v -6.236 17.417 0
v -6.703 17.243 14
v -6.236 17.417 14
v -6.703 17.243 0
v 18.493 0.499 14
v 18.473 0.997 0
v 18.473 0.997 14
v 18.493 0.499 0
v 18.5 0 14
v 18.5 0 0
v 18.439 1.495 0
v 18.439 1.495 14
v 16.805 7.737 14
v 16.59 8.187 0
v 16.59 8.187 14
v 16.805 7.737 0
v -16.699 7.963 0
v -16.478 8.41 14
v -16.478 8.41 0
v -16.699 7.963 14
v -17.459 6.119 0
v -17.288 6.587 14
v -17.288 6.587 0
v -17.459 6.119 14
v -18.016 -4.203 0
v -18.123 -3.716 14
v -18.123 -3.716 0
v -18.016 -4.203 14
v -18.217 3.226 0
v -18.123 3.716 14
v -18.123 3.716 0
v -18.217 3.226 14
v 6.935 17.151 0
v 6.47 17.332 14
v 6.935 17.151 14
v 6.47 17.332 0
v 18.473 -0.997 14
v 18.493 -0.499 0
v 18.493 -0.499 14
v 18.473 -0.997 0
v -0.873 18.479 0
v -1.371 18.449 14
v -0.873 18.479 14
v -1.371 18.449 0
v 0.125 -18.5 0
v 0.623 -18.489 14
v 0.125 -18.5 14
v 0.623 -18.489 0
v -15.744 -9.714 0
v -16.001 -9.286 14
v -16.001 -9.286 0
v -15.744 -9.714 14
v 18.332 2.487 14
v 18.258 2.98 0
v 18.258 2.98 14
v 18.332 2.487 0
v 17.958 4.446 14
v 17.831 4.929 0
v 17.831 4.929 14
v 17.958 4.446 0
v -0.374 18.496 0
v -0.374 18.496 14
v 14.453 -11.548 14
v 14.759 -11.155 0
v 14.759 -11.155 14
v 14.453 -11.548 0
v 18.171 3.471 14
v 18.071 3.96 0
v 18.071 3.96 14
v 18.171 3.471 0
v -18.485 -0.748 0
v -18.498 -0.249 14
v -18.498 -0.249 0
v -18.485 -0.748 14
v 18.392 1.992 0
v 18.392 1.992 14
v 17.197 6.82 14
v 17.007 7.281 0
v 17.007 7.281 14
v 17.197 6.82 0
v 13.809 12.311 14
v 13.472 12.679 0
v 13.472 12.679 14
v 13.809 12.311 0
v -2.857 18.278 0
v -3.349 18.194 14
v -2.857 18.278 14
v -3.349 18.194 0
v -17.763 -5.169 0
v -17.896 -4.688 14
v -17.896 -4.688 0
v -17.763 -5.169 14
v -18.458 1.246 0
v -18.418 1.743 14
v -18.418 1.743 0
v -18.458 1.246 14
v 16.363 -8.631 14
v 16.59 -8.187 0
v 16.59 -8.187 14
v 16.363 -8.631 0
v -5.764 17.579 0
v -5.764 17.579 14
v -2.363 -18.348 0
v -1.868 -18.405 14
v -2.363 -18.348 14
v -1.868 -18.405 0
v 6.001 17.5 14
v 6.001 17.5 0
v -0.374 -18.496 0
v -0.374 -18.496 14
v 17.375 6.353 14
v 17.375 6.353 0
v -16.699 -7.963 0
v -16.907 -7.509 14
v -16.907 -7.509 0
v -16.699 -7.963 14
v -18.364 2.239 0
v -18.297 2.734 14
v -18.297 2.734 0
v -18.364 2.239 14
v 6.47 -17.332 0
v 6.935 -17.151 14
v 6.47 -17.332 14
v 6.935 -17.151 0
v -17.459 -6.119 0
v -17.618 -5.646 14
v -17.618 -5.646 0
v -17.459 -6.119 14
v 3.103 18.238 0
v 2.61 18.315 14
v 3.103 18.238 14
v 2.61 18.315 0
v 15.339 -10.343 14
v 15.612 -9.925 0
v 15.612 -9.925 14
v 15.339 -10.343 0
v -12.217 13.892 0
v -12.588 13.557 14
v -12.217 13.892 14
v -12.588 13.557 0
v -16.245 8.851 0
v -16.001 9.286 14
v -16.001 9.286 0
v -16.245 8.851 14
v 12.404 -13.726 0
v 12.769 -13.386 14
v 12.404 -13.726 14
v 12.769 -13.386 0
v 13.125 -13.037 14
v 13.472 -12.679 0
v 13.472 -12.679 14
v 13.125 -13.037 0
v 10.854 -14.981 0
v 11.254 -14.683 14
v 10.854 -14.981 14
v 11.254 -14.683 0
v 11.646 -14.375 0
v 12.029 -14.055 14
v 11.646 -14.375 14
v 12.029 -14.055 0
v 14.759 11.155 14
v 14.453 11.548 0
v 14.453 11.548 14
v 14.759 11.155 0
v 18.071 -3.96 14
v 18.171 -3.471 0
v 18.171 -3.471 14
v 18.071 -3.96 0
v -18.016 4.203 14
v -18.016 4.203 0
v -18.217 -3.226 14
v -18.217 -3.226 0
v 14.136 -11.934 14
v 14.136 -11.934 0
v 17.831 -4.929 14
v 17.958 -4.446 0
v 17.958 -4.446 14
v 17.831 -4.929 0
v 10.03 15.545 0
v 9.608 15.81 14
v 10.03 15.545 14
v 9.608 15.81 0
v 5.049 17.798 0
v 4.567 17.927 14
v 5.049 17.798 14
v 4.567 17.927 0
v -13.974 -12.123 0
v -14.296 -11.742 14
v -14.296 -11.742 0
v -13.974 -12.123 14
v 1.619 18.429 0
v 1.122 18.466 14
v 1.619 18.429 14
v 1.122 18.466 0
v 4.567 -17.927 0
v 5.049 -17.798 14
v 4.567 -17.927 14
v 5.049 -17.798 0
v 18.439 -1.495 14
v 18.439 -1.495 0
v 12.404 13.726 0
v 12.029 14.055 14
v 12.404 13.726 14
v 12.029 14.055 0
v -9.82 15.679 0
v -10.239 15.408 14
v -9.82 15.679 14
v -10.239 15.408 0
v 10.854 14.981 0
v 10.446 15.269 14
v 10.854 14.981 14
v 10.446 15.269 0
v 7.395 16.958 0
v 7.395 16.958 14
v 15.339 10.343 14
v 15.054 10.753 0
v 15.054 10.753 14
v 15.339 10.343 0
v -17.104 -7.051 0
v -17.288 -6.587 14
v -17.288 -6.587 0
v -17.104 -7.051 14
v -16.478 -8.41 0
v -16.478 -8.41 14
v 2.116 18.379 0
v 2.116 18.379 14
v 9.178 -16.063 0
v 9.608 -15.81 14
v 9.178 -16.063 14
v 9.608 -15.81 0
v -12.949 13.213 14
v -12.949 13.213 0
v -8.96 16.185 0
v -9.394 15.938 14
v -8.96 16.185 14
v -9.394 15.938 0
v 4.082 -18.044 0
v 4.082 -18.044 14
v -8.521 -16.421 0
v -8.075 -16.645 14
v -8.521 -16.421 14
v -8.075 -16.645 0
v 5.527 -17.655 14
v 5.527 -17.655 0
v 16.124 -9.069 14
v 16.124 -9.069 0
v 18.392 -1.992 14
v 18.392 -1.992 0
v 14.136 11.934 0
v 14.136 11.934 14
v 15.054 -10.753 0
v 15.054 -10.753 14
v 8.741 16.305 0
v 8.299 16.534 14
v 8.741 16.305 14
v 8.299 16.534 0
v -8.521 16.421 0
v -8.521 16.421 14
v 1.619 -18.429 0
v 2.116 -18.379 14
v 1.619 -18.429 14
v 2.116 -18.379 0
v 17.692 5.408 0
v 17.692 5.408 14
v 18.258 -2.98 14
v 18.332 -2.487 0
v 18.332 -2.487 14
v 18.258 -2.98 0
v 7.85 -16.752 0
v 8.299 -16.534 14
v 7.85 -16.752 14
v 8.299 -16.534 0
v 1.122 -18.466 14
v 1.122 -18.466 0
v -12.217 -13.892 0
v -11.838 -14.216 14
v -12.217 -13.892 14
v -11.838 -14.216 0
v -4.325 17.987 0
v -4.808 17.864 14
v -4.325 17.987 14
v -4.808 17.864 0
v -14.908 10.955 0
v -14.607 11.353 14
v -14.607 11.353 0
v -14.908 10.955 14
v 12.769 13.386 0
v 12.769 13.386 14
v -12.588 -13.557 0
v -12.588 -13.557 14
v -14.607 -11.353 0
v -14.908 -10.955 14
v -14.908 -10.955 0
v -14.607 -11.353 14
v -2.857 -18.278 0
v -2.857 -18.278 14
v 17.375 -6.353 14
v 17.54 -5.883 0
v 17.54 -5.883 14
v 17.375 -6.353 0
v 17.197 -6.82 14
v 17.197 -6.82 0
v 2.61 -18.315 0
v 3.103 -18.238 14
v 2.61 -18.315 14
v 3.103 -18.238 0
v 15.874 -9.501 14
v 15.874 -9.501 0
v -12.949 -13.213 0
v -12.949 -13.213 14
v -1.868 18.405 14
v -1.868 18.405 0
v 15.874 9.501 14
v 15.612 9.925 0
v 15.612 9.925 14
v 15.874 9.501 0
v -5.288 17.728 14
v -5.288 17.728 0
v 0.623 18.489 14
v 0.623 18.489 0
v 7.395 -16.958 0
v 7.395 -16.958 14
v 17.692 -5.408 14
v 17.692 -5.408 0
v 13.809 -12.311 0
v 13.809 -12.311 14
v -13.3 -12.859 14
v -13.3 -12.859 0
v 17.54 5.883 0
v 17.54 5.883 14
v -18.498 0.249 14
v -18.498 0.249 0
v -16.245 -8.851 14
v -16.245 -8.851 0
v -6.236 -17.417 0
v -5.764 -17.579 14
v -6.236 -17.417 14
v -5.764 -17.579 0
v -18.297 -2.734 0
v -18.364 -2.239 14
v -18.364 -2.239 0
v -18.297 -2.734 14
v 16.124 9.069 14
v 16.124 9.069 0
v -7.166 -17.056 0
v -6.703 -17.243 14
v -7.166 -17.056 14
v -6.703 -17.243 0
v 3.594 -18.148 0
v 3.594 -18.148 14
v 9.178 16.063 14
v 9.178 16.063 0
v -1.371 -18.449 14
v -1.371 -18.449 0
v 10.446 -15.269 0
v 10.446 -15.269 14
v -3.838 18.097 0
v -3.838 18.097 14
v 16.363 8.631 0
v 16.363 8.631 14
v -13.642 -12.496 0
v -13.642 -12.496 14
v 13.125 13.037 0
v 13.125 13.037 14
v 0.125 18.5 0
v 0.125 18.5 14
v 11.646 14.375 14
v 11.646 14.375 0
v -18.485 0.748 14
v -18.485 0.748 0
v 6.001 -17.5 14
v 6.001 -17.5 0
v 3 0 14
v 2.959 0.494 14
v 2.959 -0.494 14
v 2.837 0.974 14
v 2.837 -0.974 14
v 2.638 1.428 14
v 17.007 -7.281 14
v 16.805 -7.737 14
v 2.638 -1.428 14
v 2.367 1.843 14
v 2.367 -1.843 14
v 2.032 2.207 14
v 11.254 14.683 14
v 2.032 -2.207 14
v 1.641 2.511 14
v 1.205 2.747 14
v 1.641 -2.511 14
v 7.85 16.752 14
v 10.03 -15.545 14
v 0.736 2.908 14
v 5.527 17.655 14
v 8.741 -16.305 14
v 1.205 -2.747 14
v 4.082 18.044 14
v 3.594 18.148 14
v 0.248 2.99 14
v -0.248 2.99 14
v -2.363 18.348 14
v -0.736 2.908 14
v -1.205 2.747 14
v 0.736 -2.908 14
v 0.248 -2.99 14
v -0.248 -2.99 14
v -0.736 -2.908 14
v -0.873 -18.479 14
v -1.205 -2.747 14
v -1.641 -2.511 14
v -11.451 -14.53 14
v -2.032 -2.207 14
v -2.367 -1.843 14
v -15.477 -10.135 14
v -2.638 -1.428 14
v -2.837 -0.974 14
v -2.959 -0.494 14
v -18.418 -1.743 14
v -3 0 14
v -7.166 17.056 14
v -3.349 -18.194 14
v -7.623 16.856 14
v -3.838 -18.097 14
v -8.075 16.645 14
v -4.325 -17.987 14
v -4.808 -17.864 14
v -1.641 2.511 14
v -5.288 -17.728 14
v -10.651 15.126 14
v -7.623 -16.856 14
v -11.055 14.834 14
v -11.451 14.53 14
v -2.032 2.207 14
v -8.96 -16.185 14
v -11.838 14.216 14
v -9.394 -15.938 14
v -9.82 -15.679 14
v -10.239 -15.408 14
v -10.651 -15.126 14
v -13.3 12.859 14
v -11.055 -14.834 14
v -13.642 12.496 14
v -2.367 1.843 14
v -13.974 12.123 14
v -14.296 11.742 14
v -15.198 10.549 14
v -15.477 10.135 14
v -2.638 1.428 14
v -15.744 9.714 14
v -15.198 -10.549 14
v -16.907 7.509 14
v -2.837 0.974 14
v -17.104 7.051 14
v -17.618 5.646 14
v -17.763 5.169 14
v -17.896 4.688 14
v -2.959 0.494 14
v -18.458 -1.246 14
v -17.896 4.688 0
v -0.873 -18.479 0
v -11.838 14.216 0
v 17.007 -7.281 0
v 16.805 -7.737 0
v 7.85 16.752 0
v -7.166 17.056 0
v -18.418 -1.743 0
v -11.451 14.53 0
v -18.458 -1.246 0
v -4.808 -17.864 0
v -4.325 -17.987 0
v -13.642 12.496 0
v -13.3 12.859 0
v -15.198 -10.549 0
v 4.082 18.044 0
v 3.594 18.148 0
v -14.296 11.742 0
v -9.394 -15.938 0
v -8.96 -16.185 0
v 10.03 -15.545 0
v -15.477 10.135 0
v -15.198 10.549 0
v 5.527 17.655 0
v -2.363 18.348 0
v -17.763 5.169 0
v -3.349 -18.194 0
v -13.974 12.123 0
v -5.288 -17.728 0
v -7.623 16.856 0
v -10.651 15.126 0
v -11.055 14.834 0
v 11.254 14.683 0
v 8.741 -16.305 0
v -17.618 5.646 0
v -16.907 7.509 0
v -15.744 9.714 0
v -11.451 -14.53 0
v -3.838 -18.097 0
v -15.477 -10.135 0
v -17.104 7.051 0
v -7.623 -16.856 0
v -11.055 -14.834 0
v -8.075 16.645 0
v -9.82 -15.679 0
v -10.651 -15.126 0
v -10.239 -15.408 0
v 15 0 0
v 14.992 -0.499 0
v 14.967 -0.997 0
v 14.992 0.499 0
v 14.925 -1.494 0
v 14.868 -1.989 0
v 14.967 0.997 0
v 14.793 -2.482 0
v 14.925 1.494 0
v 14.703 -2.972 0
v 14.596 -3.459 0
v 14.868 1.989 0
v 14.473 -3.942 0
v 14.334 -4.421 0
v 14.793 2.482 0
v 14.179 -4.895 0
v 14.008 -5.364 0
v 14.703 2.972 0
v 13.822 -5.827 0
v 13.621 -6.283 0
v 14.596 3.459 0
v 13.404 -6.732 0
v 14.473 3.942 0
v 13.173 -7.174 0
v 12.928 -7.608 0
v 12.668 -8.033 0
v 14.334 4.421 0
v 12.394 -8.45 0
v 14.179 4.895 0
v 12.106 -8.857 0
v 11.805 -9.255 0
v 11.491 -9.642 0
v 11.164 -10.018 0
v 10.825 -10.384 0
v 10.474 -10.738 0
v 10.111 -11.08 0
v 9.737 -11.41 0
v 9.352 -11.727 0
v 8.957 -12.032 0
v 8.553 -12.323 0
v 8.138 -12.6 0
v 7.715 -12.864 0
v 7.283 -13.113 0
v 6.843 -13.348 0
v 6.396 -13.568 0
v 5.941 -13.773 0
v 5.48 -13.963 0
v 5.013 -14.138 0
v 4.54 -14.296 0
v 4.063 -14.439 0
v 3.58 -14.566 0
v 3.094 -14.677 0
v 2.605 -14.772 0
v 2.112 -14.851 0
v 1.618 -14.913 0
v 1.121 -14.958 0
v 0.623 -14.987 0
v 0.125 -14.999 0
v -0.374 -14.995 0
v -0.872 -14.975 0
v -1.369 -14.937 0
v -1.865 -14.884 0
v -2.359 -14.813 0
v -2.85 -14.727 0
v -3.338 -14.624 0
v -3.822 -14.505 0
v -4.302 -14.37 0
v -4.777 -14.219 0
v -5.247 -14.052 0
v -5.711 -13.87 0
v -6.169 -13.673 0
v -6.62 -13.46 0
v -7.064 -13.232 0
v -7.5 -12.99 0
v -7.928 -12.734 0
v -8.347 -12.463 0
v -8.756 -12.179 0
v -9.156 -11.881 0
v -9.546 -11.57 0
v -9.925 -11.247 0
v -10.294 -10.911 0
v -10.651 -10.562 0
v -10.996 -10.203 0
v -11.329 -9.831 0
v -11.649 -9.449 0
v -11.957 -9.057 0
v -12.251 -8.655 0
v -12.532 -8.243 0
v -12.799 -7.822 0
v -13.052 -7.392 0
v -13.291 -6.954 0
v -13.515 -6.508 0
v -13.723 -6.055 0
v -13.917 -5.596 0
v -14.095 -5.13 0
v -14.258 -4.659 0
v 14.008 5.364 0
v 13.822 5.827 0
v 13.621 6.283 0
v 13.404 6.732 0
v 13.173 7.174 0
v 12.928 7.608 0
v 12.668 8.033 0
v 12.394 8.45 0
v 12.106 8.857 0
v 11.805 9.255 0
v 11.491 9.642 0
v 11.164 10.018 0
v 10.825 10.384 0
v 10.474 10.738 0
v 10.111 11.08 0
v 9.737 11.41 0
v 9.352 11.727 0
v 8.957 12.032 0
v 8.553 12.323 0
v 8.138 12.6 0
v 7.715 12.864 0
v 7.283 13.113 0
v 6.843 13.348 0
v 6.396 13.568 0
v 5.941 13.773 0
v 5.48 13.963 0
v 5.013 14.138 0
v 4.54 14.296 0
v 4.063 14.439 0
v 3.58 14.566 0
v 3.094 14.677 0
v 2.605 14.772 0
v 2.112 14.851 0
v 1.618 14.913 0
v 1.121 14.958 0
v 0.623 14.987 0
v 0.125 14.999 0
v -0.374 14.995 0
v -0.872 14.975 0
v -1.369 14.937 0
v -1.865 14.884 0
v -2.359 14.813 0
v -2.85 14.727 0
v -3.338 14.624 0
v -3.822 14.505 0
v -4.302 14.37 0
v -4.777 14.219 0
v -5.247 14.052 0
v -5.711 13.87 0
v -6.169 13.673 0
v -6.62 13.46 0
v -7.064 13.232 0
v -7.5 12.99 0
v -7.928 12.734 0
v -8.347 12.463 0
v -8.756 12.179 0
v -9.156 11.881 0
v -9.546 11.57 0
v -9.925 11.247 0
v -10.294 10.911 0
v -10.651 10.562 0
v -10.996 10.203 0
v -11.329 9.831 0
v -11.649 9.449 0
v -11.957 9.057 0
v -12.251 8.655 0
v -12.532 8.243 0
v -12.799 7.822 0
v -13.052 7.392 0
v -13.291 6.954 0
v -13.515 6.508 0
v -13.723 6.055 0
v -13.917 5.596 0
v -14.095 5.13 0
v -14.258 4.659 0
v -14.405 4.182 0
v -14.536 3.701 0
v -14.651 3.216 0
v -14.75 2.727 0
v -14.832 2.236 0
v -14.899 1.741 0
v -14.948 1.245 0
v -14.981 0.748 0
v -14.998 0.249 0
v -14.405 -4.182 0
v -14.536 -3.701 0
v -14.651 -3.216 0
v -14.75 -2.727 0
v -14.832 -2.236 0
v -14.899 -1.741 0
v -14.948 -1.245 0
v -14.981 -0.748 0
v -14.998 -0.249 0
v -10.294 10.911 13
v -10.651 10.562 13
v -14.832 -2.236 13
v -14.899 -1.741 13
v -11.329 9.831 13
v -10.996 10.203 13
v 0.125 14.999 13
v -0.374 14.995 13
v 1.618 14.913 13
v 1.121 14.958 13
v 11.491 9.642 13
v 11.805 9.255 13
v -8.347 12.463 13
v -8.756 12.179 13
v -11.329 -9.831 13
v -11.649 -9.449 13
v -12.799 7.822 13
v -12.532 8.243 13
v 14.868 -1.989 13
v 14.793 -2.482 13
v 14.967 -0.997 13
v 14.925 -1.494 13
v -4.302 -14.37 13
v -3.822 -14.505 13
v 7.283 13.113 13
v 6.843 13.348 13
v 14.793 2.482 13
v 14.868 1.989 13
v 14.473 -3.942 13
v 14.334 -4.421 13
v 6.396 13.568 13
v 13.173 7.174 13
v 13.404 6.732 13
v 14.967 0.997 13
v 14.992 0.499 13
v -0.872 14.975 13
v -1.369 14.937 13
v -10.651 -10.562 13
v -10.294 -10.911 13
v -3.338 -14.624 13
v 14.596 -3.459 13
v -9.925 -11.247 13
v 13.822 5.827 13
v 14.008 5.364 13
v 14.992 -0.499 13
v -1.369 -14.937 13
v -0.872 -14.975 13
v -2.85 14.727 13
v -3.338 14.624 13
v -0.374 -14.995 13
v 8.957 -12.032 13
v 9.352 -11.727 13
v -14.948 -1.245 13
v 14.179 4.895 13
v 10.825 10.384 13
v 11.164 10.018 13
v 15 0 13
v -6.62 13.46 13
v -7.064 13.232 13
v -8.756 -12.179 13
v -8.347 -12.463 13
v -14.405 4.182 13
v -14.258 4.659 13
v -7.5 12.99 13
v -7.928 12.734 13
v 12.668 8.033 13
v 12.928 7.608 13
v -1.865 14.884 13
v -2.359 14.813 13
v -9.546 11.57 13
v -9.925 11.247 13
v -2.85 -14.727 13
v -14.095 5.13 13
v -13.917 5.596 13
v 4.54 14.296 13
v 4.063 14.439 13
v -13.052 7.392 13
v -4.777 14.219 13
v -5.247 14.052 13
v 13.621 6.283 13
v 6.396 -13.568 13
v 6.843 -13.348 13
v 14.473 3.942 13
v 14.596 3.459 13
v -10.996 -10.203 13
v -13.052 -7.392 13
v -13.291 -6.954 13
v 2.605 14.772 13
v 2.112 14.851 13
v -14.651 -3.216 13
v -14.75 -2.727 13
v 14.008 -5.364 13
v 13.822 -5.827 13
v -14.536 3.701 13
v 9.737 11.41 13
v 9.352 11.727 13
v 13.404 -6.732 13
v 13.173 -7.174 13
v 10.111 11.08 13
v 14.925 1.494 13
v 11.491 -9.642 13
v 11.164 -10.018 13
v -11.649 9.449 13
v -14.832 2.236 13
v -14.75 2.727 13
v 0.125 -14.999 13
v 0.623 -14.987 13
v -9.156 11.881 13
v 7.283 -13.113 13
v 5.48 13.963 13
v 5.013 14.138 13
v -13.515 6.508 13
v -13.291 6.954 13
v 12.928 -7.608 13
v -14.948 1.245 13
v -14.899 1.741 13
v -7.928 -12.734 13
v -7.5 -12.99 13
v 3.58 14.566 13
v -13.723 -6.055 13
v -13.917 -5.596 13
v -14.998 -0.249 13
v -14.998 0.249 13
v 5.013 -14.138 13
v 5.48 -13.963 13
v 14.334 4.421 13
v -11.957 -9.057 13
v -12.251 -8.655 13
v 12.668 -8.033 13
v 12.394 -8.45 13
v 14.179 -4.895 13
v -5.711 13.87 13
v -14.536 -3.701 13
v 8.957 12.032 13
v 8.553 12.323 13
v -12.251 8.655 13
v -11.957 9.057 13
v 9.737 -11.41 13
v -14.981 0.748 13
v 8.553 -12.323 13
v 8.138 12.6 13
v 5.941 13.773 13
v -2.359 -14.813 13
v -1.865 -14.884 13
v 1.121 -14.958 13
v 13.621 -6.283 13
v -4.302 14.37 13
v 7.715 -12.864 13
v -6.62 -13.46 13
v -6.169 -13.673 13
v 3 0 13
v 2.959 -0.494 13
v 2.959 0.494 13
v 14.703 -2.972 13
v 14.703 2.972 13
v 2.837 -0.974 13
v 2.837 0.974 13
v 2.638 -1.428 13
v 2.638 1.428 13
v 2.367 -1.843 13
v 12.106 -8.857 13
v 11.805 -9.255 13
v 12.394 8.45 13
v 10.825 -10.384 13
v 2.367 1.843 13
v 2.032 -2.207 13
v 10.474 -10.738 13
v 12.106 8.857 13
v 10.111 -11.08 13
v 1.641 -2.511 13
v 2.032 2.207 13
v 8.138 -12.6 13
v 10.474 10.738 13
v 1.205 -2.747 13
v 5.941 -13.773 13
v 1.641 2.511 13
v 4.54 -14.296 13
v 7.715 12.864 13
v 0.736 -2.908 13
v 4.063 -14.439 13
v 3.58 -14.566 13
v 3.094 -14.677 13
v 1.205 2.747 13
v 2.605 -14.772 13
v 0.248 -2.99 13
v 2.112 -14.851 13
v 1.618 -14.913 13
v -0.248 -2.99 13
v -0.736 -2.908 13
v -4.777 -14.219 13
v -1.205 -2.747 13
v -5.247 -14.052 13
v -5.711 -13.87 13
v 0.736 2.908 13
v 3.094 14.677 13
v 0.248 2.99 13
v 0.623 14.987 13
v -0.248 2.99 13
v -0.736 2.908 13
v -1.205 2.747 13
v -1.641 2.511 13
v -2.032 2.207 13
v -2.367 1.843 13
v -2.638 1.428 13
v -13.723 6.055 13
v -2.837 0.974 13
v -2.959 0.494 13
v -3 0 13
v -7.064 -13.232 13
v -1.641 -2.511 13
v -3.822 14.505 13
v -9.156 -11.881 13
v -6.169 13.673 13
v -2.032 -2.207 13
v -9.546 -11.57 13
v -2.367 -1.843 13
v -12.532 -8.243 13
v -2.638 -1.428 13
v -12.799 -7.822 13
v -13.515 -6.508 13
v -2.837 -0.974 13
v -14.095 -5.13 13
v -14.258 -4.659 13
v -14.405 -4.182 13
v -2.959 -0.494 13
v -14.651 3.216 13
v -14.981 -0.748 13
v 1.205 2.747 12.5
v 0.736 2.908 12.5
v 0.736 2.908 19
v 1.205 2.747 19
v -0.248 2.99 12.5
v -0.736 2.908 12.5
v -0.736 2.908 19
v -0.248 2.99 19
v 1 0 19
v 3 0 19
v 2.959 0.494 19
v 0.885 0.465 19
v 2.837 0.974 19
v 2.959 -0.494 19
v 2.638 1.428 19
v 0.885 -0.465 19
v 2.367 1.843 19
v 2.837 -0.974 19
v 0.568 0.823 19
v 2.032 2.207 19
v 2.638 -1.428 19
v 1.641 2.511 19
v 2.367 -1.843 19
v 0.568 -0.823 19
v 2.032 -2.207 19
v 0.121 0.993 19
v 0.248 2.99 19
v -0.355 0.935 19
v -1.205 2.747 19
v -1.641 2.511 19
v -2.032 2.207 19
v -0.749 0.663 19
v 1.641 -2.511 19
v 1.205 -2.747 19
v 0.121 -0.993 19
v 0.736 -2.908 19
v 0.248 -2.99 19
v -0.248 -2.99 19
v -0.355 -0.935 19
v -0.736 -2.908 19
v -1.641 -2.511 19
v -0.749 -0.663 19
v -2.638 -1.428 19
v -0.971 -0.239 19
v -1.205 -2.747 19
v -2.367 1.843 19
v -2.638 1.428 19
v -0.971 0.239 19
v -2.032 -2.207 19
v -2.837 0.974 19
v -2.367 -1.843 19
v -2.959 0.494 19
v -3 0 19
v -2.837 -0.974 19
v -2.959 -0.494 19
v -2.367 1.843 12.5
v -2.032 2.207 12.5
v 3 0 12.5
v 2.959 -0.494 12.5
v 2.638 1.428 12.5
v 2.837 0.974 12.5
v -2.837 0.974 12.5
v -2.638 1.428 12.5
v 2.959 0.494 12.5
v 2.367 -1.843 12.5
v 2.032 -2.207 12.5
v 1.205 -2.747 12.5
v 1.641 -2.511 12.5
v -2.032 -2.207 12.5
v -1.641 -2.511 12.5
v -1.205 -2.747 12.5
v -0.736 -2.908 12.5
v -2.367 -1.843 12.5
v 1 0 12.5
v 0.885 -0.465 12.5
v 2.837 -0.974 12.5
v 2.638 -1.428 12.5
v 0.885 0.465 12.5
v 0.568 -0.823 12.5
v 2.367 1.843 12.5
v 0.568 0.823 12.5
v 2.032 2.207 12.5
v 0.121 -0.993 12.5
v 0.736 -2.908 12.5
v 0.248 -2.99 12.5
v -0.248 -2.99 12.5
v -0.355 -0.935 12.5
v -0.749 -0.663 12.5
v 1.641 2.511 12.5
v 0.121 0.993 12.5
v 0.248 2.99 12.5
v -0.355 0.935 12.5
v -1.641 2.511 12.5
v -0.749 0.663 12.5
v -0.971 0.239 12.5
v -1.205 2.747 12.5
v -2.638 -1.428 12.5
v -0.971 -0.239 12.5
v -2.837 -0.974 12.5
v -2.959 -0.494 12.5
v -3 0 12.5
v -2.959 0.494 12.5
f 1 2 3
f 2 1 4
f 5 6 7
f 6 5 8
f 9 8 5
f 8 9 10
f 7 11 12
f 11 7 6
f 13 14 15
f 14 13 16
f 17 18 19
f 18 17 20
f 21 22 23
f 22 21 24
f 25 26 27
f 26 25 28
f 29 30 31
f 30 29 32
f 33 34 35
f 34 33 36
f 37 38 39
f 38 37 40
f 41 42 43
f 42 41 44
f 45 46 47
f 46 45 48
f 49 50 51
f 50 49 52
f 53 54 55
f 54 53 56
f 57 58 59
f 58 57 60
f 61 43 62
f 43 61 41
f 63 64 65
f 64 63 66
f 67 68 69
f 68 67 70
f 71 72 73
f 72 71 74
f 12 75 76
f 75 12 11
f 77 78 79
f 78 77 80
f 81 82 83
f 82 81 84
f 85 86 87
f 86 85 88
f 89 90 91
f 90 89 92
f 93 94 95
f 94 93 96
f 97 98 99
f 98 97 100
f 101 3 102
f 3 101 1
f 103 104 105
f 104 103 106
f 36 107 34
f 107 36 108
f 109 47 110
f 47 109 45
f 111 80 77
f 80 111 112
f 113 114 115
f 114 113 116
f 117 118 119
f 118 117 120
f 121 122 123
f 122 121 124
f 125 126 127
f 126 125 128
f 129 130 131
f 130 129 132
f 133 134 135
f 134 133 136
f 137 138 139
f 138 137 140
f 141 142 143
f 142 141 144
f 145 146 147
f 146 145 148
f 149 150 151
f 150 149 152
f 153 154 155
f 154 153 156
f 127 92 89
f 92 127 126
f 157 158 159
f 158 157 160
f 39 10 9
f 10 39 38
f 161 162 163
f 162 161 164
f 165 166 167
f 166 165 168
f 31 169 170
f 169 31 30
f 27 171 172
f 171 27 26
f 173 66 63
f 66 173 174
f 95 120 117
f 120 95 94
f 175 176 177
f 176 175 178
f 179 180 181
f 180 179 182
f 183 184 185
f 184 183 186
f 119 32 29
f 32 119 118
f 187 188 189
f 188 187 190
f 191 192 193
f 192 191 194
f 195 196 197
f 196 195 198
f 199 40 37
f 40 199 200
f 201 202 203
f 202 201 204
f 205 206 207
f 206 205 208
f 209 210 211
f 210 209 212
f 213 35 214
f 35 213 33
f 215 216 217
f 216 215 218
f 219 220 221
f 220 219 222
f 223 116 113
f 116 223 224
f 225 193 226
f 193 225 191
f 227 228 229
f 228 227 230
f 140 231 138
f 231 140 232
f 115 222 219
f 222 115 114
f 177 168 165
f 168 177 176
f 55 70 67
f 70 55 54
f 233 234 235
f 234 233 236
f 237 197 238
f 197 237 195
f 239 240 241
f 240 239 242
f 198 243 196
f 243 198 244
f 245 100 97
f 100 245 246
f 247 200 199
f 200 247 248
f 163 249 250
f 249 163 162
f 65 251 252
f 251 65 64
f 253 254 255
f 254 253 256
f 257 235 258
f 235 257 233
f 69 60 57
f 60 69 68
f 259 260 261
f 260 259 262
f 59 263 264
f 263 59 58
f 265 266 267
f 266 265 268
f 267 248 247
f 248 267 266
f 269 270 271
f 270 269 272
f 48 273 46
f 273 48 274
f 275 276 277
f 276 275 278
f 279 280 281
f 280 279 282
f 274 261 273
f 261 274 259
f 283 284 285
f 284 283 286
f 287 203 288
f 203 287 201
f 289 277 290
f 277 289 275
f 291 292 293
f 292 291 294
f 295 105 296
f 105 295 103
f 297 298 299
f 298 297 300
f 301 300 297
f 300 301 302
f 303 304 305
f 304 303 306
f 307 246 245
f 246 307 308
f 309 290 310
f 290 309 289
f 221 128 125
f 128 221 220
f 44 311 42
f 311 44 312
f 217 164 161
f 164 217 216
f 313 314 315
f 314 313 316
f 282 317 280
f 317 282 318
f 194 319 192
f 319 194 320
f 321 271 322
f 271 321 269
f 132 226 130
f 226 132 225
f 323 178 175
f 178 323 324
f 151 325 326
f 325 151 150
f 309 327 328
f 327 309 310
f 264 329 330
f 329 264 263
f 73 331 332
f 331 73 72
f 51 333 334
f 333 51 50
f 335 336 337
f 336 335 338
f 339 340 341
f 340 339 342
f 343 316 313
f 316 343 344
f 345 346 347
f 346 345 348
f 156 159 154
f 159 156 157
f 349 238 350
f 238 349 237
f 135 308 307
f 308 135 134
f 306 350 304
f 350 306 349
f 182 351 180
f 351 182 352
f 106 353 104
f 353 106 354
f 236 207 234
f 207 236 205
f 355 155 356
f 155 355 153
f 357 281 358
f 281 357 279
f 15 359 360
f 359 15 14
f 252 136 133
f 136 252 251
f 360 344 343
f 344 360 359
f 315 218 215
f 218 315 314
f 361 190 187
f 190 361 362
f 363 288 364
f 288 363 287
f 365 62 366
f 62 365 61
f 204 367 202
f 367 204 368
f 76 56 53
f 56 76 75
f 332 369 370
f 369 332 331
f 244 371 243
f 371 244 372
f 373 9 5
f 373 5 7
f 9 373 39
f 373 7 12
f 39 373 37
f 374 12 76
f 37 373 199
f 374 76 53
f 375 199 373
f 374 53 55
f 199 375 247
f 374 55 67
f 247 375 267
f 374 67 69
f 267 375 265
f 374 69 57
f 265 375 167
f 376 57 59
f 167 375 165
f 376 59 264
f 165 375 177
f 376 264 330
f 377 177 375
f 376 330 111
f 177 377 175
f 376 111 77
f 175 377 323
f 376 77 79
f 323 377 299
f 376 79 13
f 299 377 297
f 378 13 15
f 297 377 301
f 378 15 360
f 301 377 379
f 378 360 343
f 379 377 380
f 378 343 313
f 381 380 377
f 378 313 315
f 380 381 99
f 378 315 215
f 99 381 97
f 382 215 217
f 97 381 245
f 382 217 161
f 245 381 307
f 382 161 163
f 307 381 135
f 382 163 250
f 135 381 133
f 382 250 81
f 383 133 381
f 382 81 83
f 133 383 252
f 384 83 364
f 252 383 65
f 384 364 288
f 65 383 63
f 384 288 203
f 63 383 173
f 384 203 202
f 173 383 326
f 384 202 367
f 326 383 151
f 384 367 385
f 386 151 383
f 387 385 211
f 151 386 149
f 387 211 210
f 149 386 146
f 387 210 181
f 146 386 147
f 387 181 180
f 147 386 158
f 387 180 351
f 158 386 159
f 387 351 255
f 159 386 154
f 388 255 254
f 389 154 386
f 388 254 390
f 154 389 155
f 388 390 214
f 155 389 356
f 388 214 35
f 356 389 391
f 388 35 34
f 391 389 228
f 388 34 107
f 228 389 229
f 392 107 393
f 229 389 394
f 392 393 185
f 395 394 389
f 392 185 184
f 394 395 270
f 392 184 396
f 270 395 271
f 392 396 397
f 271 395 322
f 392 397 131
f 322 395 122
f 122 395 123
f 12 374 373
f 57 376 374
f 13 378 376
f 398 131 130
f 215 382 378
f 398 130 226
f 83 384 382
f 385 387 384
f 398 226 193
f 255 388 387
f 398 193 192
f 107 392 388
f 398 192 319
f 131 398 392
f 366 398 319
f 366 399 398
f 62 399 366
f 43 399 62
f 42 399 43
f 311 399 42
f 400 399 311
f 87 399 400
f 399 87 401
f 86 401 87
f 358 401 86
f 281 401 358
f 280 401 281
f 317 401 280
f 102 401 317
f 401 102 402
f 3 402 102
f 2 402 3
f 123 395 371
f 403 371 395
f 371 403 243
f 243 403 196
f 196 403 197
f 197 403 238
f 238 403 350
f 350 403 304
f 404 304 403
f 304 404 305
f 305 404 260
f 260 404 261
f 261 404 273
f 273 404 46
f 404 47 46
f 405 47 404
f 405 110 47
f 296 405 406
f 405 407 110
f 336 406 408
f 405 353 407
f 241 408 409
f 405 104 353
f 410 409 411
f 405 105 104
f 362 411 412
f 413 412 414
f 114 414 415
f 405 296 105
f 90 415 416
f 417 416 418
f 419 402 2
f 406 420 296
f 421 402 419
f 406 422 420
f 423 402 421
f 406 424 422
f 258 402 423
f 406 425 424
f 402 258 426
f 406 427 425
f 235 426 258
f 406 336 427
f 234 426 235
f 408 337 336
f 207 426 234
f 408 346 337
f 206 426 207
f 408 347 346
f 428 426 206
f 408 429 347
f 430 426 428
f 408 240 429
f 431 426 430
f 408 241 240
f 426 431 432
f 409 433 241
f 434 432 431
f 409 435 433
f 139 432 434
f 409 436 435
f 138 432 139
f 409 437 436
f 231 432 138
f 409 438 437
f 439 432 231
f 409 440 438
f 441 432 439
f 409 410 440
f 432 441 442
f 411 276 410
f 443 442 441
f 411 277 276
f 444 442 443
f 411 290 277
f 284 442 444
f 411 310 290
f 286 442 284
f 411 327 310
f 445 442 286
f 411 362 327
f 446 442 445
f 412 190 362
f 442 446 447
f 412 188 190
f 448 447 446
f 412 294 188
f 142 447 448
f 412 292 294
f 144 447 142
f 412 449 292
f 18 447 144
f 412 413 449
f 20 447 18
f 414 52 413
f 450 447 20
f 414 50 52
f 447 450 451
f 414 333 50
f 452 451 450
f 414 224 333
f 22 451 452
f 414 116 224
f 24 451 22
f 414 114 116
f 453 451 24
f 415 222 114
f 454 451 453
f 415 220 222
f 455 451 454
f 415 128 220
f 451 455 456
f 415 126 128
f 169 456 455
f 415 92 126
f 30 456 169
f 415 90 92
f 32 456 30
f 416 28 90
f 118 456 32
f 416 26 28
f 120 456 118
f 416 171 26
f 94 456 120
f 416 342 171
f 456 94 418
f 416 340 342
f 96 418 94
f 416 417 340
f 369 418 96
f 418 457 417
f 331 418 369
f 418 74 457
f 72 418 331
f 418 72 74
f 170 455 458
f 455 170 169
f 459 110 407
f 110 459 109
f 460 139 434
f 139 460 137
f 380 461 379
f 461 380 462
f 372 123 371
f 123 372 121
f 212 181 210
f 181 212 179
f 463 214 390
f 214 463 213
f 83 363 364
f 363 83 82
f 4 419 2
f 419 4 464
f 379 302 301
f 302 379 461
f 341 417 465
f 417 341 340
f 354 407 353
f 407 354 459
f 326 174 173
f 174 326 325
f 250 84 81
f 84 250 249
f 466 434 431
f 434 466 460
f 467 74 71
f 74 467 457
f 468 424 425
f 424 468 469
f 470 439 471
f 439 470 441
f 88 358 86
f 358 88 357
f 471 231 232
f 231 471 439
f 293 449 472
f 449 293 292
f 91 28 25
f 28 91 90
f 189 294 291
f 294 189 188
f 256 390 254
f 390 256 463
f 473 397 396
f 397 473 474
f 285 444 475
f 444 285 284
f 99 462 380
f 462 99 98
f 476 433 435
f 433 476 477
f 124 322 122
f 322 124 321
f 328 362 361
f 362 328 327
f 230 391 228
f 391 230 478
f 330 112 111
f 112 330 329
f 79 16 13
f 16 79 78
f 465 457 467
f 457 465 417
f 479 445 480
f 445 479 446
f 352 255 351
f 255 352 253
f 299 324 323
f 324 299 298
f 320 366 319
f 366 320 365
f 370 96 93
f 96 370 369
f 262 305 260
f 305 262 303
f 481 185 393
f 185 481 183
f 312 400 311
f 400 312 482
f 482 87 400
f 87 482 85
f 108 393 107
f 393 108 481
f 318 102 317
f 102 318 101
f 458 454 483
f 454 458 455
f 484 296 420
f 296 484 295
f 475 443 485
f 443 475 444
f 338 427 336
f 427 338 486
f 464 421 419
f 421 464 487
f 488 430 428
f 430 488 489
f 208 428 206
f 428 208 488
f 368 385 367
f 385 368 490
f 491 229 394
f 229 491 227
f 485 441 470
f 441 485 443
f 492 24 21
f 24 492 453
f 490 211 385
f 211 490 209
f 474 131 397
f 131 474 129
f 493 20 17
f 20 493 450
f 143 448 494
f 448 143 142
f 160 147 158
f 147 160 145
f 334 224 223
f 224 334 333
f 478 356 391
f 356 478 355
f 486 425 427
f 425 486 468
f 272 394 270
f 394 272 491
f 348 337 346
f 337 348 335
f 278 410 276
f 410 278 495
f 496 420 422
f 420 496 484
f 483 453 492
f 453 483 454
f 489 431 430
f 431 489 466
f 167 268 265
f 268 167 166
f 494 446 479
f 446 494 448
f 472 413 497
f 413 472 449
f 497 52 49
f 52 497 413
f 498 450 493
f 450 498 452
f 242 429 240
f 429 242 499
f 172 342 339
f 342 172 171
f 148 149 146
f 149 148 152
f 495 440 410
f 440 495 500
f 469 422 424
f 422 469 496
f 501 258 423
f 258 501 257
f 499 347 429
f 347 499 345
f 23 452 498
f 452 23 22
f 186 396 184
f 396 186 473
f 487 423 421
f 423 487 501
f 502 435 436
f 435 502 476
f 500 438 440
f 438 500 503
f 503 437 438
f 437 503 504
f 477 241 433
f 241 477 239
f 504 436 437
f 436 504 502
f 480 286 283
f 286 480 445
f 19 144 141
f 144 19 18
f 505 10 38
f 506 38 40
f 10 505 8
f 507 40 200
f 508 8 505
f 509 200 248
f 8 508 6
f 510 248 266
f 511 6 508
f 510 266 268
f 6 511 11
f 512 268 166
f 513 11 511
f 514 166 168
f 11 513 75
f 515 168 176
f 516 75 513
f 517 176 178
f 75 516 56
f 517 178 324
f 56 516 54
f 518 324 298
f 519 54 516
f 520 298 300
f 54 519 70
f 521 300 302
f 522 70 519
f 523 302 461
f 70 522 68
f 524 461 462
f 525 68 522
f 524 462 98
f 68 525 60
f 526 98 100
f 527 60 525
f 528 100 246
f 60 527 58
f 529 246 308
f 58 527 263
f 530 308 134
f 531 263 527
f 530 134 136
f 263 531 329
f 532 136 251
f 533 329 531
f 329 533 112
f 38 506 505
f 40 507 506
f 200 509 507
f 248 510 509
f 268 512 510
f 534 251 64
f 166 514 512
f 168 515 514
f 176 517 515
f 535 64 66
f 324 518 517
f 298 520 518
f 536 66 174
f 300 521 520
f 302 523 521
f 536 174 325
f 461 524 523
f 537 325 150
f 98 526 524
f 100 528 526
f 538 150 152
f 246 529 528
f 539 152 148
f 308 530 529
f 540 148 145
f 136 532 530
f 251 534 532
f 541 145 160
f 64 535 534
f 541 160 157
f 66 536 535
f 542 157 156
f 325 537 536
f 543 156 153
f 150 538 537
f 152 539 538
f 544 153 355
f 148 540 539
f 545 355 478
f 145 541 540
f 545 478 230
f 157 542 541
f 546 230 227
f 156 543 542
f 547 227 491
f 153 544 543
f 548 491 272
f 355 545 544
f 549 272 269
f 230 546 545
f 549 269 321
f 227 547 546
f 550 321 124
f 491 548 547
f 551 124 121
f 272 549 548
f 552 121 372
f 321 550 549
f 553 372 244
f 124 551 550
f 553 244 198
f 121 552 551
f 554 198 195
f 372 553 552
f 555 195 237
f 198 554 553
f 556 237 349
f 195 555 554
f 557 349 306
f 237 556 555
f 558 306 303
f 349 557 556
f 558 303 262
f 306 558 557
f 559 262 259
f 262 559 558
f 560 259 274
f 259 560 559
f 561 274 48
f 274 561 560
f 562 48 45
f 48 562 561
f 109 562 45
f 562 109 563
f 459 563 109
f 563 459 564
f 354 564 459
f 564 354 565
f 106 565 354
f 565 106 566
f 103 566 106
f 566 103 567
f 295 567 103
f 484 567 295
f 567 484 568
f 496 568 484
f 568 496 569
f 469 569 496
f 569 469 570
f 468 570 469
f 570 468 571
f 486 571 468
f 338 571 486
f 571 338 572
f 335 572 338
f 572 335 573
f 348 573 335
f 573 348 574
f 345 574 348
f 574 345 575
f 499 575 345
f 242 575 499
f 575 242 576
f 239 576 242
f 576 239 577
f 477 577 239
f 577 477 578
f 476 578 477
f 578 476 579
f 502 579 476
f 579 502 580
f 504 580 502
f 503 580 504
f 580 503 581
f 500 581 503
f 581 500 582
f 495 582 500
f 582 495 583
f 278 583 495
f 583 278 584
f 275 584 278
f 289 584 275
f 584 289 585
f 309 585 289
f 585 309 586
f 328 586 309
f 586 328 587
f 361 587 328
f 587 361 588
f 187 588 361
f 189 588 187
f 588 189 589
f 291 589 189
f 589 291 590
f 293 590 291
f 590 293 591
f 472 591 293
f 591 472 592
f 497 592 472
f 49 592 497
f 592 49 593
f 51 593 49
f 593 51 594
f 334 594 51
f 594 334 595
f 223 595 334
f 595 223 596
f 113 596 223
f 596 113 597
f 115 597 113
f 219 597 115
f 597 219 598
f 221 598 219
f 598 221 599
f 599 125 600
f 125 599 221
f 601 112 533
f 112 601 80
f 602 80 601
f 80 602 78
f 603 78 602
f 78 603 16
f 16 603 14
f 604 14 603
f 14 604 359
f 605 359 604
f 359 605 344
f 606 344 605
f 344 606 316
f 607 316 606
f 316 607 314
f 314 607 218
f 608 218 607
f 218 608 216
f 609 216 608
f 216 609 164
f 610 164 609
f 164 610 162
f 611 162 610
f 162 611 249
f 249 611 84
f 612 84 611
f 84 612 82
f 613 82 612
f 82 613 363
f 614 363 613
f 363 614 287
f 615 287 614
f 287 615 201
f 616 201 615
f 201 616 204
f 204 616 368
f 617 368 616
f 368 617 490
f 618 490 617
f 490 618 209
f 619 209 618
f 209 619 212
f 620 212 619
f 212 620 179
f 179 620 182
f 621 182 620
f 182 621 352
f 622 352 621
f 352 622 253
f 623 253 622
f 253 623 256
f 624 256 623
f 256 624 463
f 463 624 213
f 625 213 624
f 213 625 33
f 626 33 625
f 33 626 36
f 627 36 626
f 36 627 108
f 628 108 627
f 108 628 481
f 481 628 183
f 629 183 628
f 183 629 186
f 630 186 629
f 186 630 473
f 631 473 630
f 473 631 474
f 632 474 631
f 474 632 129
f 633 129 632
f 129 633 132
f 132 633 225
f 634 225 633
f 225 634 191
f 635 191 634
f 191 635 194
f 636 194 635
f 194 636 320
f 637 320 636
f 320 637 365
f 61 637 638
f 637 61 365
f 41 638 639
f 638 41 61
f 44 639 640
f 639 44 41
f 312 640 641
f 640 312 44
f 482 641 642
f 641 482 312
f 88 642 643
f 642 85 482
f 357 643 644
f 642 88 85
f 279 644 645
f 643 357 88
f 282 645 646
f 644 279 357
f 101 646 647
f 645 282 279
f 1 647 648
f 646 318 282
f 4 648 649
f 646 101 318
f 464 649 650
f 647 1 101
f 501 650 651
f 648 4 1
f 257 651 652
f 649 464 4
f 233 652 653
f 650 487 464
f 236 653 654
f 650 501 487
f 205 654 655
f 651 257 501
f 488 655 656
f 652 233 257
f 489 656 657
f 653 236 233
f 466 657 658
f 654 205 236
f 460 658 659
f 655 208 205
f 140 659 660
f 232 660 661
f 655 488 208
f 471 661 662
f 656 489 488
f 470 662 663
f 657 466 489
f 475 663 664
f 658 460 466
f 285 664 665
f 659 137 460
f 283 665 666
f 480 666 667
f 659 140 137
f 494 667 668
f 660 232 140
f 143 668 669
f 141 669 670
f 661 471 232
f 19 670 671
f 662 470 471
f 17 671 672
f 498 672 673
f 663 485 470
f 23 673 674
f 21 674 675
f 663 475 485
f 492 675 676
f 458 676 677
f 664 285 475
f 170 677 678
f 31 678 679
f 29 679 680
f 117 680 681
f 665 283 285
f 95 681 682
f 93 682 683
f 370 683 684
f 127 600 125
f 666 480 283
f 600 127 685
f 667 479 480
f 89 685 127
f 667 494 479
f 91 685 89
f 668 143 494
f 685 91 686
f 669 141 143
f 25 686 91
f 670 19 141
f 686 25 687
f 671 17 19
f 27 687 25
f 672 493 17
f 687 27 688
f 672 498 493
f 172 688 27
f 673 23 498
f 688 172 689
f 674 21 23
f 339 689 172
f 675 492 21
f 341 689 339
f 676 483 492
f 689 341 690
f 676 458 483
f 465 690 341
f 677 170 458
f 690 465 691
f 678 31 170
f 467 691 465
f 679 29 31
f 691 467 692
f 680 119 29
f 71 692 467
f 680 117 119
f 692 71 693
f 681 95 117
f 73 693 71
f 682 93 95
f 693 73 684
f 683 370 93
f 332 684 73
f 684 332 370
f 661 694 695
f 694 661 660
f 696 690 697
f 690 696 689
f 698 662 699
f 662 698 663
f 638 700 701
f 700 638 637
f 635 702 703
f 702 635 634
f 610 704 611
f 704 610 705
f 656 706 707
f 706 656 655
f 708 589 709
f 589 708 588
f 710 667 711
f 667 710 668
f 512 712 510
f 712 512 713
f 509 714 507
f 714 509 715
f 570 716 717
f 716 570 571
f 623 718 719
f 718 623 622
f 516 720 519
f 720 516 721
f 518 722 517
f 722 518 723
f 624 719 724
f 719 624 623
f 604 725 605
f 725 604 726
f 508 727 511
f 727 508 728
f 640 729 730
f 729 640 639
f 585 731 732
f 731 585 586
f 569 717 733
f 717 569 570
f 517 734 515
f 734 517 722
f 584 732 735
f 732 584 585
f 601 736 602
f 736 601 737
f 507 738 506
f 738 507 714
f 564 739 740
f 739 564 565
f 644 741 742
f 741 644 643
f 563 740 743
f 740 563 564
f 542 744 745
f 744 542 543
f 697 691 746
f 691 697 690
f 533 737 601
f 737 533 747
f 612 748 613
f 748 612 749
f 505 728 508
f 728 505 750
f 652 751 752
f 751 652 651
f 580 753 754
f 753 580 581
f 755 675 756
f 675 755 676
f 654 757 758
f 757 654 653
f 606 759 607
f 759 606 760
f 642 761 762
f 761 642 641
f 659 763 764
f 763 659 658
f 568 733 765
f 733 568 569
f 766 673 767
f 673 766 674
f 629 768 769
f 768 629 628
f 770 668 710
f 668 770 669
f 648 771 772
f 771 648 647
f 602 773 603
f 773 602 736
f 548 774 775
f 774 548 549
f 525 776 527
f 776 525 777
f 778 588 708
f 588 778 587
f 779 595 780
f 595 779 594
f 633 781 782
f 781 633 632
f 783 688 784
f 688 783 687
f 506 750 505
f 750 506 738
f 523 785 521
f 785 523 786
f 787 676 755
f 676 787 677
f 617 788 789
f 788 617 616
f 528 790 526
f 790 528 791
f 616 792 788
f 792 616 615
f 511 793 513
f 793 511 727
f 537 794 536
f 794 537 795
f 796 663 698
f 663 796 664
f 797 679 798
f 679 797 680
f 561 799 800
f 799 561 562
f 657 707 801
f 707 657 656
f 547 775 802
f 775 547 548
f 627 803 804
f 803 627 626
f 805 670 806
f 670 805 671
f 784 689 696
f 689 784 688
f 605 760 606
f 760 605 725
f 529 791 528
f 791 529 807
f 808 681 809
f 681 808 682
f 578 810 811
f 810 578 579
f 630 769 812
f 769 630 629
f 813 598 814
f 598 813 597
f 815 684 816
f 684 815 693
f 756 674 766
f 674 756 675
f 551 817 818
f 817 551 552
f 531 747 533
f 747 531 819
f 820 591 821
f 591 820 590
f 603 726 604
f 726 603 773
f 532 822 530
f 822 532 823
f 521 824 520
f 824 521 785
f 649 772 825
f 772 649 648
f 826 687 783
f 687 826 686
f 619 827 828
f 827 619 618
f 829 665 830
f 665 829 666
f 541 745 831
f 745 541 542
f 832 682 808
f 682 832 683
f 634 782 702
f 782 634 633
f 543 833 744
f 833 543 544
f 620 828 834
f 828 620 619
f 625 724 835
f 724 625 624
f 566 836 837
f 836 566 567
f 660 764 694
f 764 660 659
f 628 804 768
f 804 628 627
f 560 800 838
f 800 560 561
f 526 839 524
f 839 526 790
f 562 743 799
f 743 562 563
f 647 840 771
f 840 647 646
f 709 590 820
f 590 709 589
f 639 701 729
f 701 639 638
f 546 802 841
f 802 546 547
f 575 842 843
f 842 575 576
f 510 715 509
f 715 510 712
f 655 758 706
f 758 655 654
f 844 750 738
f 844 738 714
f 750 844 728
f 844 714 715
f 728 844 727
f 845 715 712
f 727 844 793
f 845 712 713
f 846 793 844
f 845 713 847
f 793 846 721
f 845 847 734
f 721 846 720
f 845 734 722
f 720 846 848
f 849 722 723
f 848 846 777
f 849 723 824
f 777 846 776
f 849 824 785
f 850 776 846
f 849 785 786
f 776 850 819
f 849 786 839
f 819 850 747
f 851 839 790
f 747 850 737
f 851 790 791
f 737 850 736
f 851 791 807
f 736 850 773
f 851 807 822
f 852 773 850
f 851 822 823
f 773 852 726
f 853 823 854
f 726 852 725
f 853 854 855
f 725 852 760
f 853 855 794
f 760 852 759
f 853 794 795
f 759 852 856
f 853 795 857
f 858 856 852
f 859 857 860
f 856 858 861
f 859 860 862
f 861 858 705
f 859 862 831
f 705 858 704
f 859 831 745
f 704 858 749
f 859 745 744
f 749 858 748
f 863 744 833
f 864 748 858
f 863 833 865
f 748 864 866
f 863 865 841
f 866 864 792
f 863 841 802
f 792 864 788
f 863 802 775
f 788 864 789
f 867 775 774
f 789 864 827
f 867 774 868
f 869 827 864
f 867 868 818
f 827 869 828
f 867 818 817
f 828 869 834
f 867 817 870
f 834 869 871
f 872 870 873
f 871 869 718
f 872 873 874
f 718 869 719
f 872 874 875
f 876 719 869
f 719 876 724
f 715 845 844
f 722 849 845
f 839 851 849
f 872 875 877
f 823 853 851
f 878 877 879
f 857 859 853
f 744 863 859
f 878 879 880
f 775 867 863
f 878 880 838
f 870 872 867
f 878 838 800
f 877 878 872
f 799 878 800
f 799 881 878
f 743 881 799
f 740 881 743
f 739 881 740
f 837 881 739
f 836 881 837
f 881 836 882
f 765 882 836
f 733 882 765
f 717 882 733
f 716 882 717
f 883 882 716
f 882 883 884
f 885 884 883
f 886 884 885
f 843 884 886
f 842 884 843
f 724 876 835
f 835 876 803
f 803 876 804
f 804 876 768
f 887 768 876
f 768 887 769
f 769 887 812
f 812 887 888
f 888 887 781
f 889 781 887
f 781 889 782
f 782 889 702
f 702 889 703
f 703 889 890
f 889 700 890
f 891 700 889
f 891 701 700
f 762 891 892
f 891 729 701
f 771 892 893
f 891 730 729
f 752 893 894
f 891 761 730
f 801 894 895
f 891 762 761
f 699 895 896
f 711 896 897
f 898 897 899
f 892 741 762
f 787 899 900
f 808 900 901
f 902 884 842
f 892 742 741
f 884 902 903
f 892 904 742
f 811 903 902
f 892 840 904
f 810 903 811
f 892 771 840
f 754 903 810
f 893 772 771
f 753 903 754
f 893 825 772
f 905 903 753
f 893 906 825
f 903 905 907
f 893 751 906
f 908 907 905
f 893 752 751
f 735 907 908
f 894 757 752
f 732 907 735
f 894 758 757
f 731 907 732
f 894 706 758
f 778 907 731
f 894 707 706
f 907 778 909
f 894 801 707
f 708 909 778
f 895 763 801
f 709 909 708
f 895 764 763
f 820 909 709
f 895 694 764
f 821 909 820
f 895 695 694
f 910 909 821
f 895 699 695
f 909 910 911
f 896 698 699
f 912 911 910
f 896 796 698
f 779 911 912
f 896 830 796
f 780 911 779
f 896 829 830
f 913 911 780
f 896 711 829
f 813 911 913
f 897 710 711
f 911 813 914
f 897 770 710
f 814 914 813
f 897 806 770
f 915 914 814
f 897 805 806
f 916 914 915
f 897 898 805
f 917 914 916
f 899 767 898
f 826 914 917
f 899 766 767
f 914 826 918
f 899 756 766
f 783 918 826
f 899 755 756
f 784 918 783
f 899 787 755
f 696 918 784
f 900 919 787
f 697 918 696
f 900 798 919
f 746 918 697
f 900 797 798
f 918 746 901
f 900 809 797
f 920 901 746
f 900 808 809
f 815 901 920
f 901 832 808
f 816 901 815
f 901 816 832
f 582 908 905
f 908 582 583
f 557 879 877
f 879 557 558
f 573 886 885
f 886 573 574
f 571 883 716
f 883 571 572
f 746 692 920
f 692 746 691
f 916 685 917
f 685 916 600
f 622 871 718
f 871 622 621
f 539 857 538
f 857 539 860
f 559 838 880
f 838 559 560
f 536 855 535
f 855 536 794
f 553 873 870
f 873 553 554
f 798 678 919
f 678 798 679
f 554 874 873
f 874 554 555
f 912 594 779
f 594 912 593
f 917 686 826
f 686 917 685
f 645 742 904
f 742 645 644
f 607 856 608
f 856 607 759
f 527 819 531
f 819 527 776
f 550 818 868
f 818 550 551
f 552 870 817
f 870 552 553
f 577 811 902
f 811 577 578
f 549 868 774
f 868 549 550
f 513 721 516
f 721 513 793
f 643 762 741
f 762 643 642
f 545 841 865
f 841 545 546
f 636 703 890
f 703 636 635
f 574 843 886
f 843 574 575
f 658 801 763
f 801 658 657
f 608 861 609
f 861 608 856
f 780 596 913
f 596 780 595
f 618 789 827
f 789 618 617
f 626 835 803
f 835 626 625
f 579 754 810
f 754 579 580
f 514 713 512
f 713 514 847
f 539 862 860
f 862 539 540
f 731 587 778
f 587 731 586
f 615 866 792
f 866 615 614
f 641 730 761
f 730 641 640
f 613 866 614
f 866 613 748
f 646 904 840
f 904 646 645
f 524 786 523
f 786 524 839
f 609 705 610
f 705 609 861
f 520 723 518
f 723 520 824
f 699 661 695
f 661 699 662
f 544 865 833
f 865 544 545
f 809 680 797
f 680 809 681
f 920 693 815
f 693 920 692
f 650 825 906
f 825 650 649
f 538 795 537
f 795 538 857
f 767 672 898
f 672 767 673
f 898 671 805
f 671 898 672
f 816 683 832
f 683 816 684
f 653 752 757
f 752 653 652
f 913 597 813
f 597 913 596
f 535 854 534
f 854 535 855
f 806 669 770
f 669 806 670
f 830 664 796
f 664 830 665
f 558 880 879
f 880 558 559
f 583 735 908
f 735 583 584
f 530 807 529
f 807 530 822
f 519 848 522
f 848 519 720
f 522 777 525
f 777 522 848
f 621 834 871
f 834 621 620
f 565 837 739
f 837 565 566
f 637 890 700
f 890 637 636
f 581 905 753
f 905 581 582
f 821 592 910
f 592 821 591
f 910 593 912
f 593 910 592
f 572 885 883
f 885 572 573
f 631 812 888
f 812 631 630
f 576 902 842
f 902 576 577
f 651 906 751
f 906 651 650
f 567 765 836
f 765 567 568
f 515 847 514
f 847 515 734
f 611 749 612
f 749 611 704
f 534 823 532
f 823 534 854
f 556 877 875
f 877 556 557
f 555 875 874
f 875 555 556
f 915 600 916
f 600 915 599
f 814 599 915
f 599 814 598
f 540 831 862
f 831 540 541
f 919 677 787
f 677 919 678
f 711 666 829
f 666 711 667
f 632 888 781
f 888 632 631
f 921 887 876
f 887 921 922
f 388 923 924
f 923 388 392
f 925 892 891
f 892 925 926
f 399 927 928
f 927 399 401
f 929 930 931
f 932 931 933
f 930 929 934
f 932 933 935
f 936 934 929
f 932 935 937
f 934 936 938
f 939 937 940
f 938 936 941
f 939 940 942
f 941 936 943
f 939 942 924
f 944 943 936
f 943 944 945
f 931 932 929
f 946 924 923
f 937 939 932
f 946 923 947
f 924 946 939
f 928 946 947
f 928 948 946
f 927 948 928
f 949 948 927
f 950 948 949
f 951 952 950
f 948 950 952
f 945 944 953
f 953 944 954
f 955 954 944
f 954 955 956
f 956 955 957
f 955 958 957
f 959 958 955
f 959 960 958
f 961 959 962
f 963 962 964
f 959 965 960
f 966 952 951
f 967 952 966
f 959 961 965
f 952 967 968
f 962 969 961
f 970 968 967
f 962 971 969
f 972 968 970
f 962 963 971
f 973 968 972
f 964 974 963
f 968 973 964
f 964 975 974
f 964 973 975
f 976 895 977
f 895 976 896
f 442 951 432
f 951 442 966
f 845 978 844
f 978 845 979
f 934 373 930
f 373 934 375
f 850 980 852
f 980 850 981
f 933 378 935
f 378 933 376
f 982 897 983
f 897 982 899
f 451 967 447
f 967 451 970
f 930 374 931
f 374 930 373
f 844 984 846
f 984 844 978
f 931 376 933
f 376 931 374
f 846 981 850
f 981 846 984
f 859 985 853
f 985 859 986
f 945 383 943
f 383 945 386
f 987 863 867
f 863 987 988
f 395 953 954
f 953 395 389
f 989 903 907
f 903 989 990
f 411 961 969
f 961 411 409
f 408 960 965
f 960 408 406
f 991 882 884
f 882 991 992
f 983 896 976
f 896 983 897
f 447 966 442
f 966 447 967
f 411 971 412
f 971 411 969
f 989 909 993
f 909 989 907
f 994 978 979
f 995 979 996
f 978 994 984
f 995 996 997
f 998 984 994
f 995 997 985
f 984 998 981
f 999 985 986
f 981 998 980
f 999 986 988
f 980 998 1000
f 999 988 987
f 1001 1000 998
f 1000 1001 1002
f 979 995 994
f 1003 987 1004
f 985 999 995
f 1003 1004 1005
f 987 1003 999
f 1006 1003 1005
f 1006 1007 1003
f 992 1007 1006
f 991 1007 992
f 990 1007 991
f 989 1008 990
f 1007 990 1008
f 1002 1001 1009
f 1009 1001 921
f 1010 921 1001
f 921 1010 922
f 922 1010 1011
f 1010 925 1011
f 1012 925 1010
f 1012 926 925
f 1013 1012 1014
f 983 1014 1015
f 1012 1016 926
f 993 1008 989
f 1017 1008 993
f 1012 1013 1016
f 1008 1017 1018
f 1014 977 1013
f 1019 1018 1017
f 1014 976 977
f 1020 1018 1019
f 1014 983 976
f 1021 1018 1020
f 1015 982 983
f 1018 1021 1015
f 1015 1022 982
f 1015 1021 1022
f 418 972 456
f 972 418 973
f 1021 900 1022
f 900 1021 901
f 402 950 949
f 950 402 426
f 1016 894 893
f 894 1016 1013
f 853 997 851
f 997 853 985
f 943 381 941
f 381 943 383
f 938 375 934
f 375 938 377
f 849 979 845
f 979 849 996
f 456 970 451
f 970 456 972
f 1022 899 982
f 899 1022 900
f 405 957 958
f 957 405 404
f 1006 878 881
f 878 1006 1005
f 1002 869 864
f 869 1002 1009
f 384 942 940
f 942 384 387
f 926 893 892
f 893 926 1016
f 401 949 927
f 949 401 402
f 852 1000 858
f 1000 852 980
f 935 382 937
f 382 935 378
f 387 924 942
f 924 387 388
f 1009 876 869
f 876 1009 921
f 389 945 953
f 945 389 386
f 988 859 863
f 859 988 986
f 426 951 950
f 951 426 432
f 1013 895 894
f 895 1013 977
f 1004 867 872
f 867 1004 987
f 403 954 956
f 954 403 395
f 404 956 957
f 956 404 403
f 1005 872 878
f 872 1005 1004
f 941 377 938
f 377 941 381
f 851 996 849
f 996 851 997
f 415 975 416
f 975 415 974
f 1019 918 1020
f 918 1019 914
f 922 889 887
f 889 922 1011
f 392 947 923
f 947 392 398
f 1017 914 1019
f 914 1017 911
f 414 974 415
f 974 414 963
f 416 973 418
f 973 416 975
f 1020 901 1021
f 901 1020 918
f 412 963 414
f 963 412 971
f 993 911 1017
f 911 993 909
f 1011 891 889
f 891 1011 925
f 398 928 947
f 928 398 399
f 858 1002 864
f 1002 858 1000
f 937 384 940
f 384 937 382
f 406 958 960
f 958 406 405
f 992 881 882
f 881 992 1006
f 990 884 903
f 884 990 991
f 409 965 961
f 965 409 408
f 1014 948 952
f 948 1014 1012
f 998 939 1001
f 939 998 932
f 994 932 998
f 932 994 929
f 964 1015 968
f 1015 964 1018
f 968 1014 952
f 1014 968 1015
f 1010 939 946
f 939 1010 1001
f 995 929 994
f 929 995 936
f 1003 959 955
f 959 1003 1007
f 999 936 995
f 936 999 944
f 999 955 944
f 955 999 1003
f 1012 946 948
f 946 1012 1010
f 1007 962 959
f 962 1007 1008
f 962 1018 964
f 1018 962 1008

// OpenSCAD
$fa=0.01;
$fs=0.5;

flywheel();

module flywheel()
{
    fw_h = 14;
    fw_od = 37; //35
    fw_id = 30;
    fw_top_h = 1;
    fw_peg_top_h = 5;
    fw_peg_bottom_h = 0.5;
    fw_peg_od = 6;
    fw_peg_id = 2;

    fw_inner_h = fw_h - fw_top_h;
    peg_total_h = fw_peg_top_h + fw_top_h + fw_peg_bottom_h;
    peg_t_z = fw_h - fw_top_h - fw_peg_bottom_h;

    difference()
    {
        union()
        {
            difference()
            {
                cylinder(d = fw_od, h = fw_h);

                translate([0,0, -1])
                    cylinder(d = fw_id, h = fw_inner_h + 1);
            }

            translate([0, 0, peg_t_z])
                cylinder(d = fw_peg_od, h = peg_total_h);
        }

        translate([0, 0, peg_t_z - 1])
            cylinder(d = fw_peg_id, h = peg_total_h + 2);
    }
}
